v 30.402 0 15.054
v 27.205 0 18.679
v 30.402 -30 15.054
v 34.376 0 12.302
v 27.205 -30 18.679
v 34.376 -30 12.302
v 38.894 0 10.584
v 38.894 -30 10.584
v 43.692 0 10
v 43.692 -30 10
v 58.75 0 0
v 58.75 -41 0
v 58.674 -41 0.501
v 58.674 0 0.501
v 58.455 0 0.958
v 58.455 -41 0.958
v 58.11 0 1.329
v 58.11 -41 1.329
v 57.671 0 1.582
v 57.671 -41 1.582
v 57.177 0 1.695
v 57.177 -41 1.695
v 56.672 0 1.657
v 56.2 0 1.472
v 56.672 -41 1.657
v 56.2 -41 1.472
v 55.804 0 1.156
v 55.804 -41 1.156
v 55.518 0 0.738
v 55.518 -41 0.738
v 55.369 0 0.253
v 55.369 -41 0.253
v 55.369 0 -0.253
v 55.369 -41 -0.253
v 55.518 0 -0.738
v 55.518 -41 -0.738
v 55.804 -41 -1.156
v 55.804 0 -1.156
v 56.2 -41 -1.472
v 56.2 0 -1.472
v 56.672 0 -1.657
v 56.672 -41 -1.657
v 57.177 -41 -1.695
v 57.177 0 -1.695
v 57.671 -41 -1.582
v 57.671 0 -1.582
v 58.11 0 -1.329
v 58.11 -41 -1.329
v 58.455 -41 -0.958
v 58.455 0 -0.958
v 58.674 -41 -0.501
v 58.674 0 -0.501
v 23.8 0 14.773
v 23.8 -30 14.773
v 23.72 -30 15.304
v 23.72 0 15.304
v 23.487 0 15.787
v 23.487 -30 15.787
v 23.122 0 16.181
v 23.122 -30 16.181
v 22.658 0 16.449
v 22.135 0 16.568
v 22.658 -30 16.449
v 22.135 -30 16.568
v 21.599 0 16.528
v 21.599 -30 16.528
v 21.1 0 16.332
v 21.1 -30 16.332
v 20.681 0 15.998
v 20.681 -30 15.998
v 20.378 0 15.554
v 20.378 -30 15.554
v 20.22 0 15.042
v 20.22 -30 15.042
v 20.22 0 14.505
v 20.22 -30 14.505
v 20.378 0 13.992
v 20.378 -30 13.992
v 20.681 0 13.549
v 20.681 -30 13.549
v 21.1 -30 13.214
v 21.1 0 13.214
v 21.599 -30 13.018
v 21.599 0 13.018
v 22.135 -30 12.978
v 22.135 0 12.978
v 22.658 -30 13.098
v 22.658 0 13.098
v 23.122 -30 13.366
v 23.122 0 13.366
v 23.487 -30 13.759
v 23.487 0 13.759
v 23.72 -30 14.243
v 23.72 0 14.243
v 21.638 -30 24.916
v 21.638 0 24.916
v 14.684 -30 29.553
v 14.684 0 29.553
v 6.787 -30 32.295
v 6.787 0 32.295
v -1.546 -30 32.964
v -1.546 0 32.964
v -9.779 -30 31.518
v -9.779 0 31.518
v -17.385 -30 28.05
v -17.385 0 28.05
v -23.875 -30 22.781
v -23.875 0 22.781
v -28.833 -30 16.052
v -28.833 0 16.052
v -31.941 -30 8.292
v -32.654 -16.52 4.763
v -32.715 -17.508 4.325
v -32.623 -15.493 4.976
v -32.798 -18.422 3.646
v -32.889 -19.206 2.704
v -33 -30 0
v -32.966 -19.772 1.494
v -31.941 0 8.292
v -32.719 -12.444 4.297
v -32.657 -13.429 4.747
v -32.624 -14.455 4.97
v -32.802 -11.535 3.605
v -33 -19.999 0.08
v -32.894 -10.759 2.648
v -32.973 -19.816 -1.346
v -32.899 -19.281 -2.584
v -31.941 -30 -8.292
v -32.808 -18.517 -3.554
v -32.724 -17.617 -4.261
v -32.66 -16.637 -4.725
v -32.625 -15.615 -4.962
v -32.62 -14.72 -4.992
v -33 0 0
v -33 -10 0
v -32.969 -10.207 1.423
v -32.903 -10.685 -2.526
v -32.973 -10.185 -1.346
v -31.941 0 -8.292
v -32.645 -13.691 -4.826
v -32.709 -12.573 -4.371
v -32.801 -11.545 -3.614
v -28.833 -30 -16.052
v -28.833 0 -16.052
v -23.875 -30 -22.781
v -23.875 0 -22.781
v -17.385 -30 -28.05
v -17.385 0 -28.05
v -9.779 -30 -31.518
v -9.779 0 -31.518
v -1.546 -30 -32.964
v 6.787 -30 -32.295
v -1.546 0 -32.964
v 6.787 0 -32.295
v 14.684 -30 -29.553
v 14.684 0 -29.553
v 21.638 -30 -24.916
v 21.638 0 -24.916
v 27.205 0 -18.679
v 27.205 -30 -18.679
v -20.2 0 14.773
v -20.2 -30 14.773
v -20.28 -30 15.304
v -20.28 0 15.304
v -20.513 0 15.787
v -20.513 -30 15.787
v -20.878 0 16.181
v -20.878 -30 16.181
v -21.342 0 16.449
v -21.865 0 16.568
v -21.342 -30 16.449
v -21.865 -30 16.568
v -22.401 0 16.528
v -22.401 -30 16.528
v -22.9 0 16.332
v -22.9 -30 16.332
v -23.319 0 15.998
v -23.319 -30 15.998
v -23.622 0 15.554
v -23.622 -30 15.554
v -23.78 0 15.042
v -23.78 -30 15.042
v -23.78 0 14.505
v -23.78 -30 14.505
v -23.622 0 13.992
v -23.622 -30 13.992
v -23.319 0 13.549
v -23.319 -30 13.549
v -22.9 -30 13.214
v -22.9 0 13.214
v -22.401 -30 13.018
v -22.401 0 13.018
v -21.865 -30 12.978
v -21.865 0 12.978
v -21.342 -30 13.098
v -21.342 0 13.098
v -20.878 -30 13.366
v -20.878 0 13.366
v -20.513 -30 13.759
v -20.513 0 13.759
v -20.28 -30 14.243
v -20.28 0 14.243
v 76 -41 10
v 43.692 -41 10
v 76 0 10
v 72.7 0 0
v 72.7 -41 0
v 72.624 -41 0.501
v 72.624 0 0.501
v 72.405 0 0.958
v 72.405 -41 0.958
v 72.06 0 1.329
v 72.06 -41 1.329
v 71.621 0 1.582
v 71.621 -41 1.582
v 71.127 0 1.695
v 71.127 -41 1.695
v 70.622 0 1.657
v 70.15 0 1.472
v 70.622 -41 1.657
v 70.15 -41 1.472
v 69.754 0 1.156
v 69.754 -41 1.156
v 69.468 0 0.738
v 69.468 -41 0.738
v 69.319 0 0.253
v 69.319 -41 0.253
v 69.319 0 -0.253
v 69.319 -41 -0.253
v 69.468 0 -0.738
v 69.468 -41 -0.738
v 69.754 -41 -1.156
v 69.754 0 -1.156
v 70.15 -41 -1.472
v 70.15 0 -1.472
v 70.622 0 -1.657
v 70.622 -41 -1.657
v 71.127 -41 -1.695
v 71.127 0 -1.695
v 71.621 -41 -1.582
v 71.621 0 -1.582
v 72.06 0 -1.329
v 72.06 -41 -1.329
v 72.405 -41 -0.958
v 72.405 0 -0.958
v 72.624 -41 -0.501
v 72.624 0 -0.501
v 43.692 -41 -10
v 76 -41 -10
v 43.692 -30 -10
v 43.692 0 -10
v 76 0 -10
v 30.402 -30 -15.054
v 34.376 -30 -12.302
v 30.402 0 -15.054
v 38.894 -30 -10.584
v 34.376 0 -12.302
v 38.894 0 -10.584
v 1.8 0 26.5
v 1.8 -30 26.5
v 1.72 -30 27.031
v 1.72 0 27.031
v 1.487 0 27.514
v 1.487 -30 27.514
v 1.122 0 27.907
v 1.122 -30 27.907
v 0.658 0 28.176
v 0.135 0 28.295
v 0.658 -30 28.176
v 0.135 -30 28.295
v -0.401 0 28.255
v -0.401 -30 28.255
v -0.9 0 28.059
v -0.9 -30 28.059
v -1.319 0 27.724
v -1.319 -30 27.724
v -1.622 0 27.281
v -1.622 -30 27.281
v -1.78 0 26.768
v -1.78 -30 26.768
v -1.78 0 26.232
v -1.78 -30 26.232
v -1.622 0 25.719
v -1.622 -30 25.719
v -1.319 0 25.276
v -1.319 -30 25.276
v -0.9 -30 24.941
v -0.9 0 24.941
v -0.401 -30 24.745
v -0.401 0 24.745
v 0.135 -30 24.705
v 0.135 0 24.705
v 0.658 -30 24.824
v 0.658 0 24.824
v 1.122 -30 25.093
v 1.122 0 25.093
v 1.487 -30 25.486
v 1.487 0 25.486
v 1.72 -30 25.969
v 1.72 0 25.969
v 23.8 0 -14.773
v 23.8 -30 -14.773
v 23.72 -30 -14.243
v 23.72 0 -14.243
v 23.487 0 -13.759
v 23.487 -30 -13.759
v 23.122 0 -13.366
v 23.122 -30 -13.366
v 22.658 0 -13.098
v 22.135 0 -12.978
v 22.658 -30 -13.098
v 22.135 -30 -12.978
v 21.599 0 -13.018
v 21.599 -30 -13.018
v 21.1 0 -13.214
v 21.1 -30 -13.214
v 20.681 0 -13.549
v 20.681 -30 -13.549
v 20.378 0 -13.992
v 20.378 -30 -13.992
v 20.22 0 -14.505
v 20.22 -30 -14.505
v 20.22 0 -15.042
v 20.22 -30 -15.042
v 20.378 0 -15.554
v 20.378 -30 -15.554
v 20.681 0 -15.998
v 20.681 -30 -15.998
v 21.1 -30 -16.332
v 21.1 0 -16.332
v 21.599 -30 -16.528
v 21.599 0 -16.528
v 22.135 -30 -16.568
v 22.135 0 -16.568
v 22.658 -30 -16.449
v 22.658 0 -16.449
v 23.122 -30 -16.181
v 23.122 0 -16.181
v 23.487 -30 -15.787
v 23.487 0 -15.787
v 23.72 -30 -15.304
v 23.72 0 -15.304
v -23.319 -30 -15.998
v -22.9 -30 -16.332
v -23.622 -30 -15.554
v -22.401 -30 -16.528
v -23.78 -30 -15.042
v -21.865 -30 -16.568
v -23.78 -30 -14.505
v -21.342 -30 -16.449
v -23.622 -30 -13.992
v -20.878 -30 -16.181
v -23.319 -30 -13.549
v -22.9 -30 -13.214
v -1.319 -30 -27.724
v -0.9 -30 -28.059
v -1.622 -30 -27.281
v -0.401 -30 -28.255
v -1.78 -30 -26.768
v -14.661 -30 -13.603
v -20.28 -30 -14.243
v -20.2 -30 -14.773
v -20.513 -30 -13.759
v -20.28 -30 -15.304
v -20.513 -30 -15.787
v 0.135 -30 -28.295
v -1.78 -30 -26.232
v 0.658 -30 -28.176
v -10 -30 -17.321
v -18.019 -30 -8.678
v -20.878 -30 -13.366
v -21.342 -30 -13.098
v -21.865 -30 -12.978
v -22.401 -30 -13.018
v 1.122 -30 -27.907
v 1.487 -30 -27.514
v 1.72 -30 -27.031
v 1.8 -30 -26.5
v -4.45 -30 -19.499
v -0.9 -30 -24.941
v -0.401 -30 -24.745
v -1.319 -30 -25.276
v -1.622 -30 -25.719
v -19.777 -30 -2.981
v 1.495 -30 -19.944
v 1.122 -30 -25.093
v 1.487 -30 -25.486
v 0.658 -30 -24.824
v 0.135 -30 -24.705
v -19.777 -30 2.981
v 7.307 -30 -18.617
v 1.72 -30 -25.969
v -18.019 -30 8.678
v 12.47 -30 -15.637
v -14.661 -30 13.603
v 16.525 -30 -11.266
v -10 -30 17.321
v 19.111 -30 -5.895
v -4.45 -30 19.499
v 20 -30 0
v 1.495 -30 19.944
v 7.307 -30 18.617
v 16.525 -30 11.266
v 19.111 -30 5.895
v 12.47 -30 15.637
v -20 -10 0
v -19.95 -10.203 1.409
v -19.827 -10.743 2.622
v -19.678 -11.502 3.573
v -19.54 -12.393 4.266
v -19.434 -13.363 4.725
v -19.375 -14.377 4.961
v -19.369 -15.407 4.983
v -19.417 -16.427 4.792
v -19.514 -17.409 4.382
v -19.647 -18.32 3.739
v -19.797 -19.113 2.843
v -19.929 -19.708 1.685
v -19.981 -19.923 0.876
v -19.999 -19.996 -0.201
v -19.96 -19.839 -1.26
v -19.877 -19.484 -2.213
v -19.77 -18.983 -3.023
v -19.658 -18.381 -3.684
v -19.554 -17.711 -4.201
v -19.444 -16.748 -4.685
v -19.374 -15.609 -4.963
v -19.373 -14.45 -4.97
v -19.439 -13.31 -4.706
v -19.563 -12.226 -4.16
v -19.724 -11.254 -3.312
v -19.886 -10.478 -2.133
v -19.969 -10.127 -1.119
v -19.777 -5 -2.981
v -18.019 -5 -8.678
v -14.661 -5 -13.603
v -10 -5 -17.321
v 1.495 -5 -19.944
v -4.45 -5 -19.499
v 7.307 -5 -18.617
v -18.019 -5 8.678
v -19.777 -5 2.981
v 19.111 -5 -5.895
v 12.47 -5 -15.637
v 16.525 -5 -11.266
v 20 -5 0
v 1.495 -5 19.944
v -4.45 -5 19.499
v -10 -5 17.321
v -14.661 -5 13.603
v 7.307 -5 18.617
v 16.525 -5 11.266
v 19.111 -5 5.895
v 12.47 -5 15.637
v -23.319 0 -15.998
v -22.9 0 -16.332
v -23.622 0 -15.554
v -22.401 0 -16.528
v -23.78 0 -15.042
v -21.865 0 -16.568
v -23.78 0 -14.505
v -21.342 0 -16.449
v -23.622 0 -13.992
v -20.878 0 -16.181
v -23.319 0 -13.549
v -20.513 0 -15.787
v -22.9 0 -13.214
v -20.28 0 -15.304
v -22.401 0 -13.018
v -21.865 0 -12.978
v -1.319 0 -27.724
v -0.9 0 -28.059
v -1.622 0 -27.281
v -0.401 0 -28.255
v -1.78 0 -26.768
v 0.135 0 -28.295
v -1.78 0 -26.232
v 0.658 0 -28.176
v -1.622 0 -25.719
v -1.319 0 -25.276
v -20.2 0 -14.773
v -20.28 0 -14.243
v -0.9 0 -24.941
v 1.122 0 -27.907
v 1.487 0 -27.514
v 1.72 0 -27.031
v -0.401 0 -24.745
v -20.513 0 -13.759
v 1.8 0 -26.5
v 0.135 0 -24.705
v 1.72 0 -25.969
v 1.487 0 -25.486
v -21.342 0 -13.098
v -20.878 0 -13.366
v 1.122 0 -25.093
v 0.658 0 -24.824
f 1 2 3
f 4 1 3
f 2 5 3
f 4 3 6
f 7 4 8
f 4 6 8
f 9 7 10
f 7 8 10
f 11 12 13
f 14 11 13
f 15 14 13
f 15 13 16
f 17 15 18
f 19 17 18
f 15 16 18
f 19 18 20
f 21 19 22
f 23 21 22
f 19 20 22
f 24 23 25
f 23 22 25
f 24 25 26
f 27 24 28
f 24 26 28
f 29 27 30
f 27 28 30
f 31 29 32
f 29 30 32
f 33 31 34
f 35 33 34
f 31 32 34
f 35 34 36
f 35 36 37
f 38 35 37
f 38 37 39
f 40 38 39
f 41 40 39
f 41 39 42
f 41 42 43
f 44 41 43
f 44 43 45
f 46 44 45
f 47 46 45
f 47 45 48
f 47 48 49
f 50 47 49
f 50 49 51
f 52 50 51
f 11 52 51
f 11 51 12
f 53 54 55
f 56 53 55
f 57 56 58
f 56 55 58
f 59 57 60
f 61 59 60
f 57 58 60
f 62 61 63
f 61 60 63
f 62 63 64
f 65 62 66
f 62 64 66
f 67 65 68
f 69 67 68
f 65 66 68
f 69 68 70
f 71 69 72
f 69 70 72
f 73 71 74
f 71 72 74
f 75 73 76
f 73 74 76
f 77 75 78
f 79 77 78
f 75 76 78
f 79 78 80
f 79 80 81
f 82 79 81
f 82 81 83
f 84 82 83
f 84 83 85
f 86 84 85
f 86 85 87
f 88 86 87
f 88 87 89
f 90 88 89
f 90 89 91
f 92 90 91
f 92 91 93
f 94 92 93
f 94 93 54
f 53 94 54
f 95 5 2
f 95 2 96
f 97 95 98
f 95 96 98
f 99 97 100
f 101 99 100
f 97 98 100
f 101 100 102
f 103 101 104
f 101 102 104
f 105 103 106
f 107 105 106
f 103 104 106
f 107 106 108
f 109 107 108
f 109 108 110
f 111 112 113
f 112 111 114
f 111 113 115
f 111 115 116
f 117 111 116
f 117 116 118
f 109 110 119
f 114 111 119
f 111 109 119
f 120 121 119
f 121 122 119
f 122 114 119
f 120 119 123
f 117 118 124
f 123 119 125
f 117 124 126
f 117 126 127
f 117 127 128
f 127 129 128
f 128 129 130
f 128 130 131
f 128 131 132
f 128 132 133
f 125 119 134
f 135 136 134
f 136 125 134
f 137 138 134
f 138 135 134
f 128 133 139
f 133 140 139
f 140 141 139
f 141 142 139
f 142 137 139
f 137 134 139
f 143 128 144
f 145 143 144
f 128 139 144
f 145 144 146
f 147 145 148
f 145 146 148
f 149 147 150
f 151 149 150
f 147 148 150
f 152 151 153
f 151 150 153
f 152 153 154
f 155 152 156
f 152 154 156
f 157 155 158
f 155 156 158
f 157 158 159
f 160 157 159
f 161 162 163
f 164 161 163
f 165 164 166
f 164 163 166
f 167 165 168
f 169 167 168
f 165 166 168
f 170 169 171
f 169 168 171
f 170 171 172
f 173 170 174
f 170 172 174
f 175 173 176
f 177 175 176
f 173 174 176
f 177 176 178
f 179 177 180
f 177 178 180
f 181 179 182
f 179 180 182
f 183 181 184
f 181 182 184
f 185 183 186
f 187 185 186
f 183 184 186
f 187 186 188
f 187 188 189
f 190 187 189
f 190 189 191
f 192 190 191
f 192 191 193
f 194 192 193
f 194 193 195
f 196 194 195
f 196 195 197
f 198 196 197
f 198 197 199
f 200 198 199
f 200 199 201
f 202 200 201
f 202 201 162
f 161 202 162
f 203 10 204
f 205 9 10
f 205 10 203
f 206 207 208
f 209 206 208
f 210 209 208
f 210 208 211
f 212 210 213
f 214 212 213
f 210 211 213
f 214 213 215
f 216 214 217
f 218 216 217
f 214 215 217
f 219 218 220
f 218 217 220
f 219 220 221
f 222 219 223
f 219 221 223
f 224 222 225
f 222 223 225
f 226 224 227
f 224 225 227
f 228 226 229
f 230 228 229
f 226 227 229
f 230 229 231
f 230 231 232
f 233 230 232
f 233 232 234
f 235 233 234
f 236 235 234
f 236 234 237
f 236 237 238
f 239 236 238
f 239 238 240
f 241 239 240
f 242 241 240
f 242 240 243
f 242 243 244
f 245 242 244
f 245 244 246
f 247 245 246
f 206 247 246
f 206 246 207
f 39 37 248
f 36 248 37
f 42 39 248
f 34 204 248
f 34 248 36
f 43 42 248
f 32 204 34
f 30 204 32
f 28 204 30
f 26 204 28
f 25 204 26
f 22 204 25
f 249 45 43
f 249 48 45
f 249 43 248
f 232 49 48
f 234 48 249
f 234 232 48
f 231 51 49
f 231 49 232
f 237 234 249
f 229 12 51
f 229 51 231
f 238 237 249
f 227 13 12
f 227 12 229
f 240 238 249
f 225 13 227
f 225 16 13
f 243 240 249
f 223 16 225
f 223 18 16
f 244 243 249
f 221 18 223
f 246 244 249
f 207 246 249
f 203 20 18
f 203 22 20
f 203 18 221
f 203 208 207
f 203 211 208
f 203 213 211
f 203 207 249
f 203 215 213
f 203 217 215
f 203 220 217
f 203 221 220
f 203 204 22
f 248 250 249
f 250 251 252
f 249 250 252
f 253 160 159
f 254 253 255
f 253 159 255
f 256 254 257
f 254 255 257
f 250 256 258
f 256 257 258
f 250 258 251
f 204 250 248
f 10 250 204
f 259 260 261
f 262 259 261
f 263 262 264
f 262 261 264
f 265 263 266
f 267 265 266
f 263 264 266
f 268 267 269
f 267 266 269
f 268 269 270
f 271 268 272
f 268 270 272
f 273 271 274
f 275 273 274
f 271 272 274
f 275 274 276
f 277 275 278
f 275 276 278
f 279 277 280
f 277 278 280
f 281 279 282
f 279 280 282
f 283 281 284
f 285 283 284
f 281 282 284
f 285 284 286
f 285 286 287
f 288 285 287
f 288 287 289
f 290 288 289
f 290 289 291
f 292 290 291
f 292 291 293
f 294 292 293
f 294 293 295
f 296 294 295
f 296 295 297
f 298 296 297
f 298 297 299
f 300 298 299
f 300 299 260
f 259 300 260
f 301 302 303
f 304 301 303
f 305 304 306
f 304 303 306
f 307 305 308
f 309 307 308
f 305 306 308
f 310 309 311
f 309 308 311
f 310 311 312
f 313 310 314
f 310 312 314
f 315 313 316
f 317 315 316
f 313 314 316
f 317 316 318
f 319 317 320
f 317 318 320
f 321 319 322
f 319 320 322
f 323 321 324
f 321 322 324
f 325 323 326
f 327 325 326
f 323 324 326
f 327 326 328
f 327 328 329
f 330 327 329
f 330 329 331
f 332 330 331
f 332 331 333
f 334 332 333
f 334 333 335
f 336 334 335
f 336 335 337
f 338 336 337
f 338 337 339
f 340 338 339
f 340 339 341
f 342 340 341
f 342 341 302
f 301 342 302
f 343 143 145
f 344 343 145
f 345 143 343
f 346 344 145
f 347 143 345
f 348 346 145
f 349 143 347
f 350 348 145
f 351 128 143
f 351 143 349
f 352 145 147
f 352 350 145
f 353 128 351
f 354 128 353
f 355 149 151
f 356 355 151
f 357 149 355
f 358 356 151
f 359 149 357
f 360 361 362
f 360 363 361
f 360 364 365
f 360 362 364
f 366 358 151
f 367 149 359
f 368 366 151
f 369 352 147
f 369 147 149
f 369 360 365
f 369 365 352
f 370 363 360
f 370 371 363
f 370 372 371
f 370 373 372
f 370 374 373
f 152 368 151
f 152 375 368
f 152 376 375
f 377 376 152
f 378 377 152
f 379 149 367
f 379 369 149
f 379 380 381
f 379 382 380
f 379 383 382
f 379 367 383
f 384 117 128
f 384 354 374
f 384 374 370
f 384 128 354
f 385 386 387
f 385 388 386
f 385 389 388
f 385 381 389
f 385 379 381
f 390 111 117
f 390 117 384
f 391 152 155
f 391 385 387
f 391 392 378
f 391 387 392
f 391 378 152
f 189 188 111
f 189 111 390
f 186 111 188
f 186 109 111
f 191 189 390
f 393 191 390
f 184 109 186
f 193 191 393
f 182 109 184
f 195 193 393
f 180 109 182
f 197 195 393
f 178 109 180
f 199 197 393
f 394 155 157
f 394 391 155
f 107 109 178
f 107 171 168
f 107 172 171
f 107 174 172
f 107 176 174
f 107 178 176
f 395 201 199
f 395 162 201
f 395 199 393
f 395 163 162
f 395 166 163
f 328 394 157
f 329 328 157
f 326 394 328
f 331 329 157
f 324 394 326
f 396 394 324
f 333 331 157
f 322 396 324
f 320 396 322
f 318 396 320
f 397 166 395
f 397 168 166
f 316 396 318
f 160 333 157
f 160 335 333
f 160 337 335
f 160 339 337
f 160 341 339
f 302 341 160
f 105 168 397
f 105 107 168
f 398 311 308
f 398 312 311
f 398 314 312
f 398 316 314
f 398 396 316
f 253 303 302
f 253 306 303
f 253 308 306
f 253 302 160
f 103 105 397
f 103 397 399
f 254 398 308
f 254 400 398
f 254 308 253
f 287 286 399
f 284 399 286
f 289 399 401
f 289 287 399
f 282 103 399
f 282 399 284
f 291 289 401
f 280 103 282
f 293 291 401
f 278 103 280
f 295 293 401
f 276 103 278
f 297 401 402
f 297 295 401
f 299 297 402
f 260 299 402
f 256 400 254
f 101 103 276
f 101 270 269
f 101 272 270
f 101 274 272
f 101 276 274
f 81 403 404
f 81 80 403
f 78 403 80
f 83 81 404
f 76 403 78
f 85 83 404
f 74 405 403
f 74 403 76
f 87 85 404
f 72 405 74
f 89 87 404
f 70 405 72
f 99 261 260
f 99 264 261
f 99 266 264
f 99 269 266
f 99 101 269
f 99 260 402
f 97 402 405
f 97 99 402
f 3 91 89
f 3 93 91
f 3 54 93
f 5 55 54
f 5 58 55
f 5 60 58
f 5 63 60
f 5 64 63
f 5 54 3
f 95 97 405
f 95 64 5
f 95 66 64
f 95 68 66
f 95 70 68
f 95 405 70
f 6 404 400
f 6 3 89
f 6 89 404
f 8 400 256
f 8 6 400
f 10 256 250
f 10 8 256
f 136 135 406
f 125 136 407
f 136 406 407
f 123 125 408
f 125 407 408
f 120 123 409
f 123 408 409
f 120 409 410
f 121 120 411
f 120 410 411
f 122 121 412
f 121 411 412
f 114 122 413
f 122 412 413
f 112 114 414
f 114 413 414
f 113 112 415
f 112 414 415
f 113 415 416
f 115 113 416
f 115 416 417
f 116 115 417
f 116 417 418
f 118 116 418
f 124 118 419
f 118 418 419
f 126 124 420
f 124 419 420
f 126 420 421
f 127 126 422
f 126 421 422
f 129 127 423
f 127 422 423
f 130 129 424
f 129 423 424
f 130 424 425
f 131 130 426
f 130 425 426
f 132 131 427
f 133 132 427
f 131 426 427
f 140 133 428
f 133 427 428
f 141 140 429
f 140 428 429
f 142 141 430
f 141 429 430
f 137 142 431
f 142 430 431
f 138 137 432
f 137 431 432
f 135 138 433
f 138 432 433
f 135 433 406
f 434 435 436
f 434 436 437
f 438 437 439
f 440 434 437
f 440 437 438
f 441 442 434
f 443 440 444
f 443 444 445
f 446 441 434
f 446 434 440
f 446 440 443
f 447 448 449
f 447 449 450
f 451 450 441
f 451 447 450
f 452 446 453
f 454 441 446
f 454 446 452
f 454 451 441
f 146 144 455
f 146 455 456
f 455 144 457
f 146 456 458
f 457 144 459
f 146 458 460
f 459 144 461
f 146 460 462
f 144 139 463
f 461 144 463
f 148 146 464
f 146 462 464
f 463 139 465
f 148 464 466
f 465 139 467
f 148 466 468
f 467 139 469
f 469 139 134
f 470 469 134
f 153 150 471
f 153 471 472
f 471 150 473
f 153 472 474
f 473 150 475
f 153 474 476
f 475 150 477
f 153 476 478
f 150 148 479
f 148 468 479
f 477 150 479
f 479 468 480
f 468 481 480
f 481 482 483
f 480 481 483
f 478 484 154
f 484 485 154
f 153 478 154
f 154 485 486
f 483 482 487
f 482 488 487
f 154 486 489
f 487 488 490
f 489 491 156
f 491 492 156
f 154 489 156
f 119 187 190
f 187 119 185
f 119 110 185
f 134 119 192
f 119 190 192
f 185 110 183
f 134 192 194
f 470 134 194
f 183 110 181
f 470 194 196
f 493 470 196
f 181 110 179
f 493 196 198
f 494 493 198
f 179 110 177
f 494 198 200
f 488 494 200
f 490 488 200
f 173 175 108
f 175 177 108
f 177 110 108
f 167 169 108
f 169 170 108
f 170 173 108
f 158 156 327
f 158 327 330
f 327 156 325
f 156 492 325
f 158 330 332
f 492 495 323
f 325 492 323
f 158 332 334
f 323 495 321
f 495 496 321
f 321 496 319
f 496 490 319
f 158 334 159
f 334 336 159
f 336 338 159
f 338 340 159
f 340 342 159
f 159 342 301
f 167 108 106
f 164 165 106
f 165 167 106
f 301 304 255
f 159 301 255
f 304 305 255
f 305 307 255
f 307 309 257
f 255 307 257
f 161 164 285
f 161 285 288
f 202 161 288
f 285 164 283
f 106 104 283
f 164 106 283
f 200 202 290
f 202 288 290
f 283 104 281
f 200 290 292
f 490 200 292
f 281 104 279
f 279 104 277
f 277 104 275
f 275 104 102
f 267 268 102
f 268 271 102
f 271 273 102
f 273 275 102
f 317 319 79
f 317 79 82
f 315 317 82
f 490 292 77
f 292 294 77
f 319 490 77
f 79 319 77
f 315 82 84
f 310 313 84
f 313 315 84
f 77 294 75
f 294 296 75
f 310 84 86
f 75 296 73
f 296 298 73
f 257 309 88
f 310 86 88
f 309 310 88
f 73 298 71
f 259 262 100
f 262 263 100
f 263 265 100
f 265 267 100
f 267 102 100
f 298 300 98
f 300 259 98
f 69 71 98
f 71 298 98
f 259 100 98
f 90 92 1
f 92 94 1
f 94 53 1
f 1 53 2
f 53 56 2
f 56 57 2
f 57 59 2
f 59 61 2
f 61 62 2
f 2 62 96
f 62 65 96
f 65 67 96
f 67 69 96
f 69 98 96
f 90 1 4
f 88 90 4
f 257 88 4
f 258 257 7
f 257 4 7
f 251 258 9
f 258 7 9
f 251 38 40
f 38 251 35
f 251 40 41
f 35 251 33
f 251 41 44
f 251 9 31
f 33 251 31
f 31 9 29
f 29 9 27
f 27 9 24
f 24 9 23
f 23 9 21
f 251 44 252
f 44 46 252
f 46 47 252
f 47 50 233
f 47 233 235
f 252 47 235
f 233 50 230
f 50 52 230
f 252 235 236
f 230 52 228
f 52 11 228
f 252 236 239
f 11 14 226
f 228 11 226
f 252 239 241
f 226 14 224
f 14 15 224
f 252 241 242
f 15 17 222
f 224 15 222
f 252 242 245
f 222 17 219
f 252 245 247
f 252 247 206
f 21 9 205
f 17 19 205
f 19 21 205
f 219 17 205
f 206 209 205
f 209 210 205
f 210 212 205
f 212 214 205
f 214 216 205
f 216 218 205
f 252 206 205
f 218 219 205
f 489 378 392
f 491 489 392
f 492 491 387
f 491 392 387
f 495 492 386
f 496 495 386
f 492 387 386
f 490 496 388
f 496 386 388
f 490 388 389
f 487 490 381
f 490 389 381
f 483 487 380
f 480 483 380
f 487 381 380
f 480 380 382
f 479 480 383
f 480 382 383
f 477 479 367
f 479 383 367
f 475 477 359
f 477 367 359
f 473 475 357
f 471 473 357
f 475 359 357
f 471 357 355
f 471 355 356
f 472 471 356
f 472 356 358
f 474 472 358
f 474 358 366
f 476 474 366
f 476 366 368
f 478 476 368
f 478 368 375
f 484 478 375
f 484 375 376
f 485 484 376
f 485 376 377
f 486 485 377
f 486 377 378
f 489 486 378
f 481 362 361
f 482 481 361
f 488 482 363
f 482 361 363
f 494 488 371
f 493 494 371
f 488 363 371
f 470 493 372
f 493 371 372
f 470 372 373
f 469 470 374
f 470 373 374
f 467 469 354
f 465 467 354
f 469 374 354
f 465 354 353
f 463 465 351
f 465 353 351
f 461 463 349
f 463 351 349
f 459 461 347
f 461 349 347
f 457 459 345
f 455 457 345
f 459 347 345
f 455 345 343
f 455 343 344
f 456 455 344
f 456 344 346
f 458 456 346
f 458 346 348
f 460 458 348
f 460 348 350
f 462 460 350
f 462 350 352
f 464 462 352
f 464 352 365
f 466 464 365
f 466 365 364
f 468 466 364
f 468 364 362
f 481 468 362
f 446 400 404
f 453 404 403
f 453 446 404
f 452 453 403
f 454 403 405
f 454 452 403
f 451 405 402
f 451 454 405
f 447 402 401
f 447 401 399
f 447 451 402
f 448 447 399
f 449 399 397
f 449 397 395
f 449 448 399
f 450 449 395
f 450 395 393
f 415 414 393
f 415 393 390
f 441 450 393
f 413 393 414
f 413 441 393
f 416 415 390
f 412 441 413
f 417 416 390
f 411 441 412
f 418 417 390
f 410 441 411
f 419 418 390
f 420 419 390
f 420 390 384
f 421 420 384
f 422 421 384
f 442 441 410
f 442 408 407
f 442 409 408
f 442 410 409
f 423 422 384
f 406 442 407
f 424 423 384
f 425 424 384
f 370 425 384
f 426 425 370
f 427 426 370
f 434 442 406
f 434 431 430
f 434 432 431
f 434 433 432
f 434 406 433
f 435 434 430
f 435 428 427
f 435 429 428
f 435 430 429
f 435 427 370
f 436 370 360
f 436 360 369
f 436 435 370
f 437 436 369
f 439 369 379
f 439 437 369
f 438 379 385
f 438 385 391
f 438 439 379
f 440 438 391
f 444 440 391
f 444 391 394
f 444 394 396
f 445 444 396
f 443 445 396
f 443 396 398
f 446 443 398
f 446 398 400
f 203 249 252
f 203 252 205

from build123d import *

# Parameters (mm, degrees)
F0_R           = 33
F1_DEPTH       = 5
F2_R           = 33
F2_R_2         = 20
F3_DEPTH       = 25
F4_R           = 1.8
F5_DEPTH       = 30.001
F7_W           = 20
F7_H           = 20
F8_DEPTH       = 52
F9_W           = 52
F9_H           = 20
F12_DEPTH      = 10
F11_R          = 5
F13_DEPTH      = 12.001
F13_DEPTH_BACK = 10
F14_R          = 20
F15_W          = 20
F15_H          = 20
F16_DEPTH      = 11
F17_R          = 1.7
F18_DEPTH      = 41.0010001
F19_W          = 17.3078954501
F19_H          = 20
F20_DEPTH      = 11
F21_R          = 1.7
F22_DEPTH      = 41.0010001
F23_W          = 5
F23_H          = 20
F24_DEPTH      = 41.0010001


# Not quite as in the source:
# - a feature names something its author has since deleted; it is built from what else it names


with BuildPart() as f1:
    # F0 (on Front) → F1 (new body)
    with BuildSketch(Plane.XZ):
        Circle(F0_R)
    extrude(amount=F1_DEPTH)

    # F2 (on face) → F3 (join)
    with BuildSketch(Plane.XZ.offset(5)):
        Circle(F2_R)
        Circle(F2_R_2, mode=Mode.SUBTRACT)
    extrude(amount=F3_DEPTH)

    # F4 (on face) → F5 (cut, through all)
    with BuildSketch(Plane.XZ.offset(30)):
        with Locations((0, 26.5)):
            Circle(F4_R)
        with Locations((22, 14.7732867027)):
            Circle(F4_R)
        with Locations((-22, 14.7732867027)):
            Circle(F4_R)
        with Locations((0, -26.5)):
            Circle(F4_R)
        with Locations((-22, -14.7732867027)):
            Circle(F4_R)
        with Locations((22, -14.7732867027)):
            Circle(F4_R)
    extrude(amount=-F5_DEPTH, mode=Mode.SUBTRACT)

    # F7 (on offset) → F8 (join)
    with BuildSketch(Plane.YZ.offset(29)):
        with Locations((-10, 0)):
            Rectangle(F7_W, F7_H)
    extrude(amount=F8_DEPTH)

    # F9 (on face) → F12 (join)
    with BuildSketch(Plane.XZ.offset(20)):
        with Locations((55, 0)):
            Rectangle(F9_W, F9_H)
    extrude(amount=F12_DEPTH)

    # F11 (on offset) → F13 (cut, two sides)
    with BuildSketch(Plane.YZ.offset(-21)) as f13_sk:
        with Locations((-15, 0)):
            Circle(F11_R)
    extrude(amount=-F13_DEPTH, mode=Mode.SUBTRACT)
    extrude(f13_sk.sketch, amount=F13_DEPTH_BACK, mode=Mode.SUBTRACT)

    # F14
    f14_edges = [f1.edges().sort_by_distance(p)[0] for p in [
        (31.44837, -15, -10),
        (31.44837, -15, 10),
    ]]
    fillet(f14_edges, radius=F14_R)

    # F15 (on face) → F16 (join)
    with BuildSketch(Plane.XZ.offset(30)):
        with Locations((71, 0)):
            Rectangle(F15_W, F15_H)
    extrude(amount=F16_DEPTH)

    # F17 (on face) → F18 (cut, through all)
    with BuildSketch(Plane.XZ.offset(41)):
        with Locations((71, 0)):
            Circle(F17_R)
    extrude(amount=-F18_DEPTH, mode=Mode.SUBTRACT)

    # F19 (on face) → F20 (join)
    with BuildSketch(Plane.XZ.offset(30)):
        with Locations((52.346052275, 0)):
            Rectangle(F19_W, F19_H)
    extrude(amount=F20_DEPTH)

    # F21 (on face) → F22 (cut, through all)
    with BuildSketch(Plane.XZ.offset(41)):
        with Locations((57.05, 0)):
            Circle(F21_R)
    extrude(amount=-F22_DEPTH, mode=Mode.SUBTRACT)

    # F23 (on face) → F24 (cut, through all)
    with BuildSketch(Plane.XZ.offset(41)):
        with Locations((78.5, 0)):
            Rectangle(F23_W, F23_H)
    extrude(amount=-F24_DEPTH, mode=Mode.SUBTRACT)


solid = f1.part
